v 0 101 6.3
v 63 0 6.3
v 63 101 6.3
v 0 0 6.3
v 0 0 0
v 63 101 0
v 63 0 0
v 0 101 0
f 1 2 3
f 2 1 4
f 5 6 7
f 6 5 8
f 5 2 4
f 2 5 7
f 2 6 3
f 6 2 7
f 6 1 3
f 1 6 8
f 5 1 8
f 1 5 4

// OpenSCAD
$fn = 20;


module warmer(){
	cube([63,101,6.3]);

}

warmer();
